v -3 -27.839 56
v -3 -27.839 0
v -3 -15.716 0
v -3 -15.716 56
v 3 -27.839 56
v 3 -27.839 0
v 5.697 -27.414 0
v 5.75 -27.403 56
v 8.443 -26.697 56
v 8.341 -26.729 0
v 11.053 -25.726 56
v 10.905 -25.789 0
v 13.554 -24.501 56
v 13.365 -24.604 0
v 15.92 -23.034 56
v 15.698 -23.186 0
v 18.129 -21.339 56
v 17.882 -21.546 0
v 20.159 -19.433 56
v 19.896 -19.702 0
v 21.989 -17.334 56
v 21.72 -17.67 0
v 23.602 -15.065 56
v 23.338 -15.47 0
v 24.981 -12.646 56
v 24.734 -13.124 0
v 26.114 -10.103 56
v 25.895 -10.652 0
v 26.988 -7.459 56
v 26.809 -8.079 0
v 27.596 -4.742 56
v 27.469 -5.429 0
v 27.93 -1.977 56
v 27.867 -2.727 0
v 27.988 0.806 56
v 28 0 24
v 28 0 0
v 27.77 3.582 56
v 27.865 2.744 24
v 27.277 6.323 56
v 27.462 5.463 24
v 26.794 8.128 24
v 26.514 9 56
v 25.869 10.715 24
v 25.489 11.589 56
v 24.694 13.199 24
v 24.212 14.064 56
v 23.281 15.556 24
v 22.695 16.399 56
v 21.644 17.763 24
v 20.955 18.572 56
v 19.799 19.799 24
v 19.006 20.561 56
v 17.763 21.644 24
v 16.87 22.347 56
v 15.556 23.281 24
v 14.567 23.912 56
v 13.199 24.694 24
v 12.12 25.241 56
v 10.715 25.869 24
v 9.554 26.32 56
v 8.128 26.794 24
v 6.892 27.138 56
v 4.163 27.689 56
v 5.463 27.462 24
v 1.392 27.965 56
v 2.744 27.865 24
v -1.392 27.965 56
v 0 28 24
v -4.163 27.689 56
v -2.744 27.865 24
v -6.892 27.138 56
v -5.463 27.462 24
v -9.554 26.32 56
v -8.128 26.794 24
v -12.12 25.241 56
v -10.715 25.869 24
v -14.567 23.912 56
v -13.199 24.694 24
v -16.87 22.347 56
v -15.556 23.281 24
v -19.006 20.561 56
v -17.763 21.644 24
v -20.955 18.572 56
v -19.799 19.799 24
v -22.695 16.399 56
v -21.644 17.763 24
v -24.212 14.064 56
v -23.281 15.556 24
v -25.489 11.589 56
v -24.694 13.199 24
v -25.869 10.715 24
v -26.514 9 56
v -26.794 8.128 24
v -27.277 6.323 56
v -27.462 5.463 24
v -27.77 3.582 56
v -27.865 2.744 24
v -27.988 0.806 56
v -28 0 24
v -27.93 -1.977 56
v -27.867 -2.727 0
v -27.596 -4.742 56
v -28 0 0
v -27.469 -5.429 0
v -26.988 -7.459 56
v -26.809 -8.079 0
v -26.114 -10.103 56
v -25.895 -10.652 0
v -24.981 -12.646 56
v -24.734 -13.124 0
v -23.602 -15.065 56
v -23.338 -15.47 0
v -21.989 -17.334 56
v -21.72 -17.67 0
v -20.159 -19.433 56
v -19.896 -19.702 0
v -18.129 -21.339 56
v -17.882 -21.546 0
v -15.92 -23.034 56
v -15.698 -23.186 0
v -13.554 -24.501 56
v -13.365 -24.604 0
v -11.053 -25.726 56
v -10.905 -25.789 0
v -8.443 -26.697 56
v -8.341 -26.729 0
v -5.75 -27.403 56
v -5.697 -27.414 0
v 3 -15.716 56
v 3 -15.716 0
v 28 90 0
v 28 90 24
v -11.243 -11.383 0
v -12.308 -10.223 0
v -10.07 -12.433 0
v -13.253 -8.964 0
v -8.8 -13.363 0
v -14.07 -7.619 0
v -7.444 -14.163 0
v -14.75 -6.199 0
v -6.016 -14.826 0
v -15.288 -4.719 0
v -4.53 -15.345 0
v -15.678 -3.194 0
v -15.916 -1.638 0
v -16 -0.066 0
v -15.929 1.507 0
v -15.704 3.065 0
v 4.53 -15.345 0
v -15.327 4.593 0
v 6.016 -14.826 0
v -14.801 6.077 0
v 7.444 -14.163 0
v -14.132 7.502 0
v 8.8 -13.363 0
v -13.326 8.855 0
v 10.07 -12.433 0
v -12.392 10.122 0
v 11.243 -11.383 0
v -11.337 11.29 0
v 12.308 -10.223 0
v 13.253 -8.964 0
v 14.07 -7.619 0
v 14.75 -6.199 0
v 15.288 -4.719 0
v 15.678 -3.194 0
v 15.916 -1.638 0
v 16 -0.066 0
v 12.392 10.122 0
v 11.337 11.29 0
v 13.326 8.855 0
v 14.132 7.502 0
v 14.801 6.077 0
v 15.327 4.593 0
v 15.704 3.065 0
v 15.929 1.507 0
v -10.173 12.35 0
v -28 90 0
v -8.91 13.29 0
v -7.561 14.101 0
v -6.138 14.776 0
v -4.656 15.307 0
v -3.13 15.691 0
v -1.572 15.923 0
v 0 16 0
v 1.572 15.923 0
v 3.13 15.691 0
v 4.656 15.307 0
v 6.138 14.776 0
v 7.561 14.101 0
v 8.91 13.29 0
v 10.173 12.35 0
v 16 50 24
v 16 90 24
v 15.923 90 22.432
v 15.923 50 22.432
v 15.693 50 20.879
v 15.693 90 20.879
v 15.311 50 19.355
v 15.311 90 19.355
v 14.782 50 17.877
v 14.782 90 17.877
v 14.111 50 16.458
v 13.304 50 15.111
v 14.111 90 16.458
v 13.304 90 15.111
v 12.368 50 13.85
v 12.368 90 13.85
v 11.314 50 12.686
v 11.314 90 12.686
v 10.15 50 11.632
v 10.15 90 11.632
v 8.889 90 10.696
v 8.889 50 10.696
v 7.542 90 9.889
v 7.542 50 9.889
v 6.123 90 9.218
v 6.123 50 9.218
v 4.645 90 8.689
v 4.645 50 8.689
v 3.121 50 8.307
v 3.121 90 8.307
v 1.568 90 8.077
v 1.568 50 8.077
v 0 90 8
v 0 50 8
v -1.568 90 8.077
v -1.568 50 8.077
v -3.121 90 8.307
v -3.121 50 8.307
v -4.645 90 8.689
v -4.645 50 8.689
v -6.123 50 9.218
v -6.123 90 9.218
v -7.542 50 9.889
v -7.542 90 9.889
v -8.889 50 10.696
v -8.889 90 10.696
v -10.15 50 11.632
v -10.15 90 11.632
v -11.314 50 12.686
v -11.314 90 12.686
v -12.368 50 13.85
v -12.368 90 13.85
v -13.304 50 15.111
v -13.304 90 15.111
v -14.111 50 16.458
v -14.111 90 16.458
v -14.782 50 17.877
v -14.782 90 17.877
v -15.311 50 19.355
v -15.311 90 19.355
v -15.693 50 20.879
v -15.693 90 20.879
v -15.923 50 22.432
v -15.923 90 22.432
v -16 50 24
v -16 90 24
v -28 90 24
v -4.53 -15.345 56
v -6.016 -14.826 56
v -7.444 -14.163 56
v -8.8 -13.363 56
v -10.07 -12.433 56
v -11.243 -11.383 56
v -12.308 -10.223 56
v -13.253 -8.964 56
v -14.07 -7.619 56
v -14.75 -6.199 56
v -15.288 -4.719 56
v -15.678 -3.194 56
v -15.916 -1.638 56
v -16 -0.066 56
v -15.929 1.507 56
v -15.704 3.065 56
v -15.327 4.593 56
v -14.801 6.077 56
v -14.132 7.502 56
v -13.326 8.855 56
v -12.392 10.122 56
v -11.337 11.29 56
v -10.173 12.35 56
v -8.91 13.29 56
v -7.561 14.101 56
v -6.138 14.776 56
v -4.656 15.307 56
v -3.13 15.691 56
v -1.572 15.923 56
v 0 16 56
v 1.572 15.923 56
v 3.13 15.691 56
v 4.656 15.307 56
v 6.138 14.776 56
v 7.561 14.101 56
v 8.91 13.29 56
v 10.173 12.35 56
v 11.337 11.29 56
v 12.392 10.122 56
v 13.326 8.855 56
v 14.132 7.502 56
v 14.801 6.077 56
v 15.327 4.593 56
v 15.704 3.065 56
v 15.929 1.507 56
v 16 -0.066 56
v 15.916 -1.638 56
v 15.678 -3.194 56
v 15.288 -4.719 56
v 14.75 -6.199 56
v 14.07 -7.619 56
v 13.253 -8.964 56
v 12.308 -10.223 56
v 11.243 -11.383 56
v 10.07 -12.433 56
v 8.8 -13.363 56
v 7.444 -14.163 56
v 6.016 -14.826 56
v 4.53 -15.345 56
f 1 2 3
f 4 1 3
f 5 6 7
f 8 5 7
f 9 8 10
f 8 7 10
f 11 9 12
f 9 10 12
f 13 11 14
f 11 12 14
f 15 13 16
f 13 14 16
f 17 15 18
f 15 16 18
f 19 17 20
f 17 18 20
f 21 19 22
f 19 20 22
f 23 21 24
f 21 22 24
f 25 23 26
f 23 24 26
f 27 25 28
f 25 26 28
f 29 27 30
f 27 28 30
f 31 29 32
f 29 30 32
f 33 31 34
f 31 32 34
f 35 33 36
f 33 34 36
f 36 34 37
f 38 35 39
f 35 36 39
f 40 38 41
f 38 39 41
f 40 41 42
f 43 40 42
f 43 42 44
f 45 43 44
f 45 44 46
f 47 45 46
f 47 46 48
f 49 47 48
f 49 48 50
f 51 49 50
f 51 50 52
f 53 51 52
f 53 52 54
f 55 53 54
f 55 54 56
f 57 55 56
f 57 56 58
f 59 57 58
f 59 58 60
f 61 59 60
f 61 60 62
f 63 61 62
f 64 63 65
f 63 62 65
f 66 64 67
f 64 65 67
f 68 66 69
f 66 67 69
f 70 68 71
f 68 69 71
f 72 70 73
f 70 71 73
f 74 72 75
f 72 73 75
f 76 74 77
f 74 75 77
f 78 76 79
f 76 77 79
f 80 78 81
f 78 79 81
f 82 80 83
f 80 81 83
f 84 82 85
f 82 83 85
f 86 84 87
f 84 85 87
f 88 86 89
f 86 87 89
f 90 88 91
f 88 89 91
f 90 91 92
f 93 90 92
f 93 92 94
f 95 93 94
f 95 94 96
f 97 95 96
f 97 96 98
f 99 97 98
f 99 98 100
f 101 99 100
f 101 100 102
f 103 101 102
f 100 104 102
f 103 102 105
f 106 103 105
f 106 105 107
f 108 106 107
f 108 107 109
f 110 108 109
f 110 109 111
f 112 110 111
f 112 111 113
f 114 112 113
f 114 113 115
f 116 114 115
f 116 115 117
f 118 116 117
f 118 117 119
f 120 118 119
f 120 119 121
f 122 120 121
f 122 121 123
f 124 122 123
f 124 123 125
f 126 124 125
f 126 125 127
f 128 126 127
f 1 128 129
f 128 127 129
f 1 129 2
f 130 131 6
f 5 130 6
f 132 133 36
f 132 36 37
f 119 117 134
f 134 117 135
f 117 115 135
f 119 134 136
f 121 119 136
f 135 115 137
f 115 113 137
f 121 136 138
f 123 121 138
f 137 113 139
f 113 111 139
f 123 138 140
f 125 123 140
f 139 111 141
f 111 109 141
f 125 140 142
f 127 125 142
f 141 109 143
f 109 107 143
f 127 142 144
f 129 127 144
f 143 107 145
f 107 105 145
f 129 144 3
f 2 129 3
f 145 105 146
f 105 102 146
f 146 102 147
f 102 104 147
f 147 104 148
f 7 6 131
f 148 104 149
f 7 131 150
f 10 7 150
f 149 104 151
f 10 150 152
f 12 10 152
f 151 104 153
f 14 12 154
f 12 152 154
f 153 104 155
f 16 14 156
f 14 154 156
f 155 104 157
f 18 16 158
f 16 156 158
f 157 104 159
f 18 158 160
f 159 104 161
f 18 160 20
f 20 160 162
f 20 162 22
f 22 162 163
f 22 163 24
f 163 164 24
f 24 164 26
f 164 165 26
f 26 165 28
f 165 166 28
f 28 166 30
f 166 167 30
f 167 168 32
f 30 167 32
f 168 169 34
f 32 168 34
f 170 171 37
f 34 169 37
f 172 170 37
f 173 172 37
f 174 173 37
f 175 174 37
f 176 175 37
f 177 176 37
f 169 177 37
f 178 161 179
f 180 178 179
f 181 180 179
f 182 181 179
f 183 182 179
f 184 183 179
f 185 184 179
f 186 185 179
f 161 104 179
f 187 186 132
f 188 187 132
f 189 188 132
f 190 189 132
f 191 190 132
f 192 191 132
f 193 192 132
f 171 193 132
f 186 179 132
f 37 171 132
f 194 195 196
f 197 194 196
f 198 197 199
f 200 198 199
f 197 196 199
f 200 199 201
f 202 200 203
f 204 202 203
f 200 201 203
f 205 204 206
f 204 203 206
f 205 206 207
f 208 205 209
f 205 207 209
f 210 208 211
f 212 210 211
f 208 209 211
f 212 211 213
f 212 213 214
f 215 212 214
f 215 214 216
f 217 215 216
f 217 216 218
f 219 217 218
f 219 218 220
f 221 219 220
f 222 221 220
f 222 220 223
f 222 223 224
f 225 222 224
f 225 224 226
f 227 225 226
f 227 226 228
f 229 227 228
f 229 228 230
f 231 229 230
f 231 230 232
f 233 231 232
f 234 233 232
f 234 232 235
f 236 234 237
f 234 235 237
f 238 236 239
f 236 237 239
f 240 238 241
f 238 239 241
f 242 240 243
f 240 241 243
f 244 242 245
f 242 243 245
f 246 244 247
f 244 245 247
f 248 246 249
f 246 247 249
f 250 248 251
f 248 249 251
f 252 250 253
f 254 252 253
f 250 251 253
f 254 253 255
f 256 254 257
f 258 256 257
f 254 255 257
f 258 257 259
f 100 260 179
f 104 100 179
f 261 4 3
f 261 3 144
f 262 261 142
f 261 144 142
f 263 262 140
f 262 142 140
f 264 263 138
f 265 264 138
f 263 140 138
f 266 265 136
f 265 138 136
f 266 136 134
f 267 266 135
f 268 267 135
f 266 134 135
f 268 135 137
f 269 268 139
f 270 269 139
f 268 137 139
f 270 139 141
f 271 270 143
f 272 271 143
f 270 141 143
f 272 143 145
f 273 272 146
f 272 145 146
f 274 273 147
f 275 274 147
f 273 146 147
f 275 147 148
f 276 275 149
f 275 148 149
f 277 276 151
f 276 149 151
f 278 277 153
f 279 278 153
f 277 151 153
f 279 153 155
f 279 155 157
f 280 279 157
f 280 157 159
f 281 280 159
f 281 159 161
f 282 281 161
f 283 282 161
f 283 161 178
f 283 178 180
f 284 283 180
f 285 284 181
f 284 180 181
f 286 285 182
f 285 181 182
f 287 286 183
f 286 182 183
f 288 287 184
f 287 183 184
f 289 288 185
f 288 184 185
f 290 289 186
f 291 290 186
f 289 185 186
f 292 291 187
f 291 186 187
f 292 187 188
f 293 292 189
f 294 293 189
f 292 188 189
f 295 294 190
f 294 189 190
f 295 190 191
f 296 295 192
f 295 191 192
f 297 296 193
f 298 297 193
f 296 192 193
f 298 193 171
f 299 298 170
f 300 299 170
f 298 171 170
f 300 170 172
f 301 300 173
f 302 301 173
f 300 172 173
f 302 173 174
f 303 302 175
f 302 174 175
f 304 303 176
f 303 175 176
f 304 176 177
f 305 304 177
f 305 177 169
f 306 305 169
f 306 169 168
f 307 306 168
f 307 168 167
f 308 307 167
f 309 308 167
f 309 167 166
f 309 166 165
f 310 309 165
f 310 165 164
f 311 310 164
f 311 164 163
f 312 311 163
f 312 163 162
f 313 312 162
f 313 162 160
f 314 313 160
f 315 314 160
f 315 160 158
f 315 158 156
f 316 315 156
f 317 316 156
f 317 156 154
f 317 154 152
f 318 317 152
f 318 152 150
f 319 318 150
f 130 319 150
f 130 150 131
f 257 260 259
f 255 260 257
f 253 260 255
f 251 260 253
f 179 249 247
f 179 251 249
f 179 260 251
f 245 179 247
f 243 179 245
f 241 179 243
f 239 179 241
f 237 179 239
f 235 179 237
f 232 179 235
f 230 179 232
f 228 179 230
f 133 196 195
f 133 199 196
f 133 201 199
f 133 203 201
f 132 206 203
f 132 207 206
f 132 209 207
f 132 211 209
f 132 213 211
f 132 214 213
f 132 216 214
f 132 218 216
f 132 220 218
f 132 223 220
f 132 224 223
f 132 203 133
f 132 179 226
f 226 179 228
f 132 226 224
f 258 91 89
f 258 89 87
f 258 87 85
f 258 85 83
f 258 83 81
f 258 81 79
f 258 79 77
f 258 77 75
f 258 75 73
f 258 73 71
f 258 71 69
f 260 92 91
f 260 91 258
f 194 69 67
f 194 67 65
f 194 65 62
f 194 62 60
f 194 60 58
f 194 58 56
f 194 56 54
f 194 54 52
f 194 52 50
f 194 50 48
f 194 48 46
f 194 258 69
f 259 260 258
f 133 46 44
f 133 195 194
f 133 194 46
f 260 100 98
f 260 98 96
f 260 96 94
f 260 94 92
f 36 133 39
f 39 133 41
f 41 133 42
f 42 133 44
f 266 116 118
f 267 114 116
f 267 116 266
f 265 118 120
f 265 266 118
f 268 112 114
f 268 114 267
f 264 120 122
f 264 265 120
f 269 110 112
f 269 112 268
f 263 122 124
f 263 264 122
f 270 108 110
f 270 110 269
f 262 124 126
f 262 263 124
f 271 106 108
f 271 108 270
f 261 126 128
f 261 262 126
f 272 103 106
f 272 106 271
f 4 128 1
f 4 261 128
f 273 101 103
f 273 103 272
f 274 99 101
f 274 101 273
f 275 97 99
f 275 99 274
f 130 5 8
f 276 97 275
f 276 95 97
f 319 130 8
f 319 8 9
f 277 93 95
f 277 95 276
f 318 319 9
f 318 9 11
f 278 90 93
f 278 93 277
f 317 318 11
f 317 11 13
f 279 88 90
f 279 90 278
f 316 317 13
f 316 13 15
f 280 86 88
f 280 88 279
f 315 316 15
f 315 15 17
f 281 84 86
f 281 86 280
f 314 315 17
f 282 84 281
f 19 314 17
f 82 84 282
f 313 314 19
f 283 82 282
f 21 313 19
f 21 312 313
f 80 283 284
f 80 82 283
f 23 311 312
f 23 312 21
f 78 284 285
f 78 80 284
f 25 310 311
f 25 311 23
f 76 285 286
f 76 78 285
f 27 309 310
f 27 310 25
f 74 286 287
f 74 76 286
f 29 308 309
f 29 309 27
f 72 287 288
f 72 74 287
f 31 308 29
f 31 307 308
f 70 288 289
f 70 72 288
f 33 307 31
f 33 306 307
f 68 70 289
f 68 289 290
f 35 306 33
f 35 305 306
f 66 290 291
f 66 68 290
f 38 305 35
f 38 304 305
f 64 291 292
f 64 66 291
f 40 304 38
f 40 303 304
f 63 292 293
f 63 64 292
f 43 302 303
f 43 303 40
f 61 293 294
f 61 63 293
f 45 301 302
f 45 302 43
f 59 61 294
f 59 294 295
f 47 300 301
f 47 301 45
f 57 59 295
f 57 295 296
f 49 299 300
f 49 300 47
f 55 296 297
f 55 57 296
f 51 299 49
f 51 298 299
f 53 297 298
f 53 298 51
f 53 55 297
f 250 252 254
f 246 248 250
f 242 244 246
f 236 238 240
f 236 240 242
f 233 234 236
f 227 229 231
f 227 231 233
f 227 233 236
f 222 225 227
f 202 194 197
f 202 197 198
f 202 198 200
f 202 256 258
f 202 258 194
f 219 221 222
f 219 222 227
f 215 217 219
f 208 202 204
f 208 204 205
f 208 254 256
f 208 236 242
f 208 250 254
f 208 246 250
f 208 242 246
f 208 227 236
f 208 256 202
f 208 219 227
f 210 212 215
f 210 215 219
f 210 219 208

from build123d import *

# Parameters (mm, degrees)
BOSS_EXTRUDE1_DEPTH      = 56
BOSS_EXTRUDE2_REACH      = 135.439
BOSS_EXTRUDE2_END_RADIUS = 28
SKETCH2_W                = 56
SKETCH2_H                = 24
CUT_EXTRUDE1_DEPTH       = 40


with BuildPart() as part:
    # Sketch1 → Boss-Extrude1 (new body)
    with BuildSketch(Plane.XY):
        with BuildLine():
            Line((-3, -27.838821814), (-3, -15.716233646))
            ThreePointArc((-3, -15.716233646), (0, 16), (3, -15.716233646))
            Line((3, -15.716233646), (3, -27.838821814))
            ThreePointArc((3, -27.838821814), (0, 28), (-3, -27.838821814))
        make_face()
    extrude(amount=BOSS_EXTRUDE1_DEPTH)

    # Boss-Extrude2: up to this cylinder (the profile starts outside it)
    boss_extrude2_end = Plane(origin=(0, 0, 12), z_dir=(0, 0, -1)) * Cylinder(BOSS_EXTRUDE2_END_RADIUS, 327.878, mode=Mode.PRIVATE)
    # Sketch2 → Boss-Extrude2 (add, up to the surface)
    with BuildSketch(Plane(origin=(0, 90, 0), x_dir=(1, 0, 0), z_dir=(0, 1, 0)), mode=Mode.PRIVATE) as boss_extrude2_sk1:
        with Locations((0, -12)):
            Rectangle(SKETCH2_W, SKETCH2_H)
    boss_extrude2_tool1 = extrude(boss_extrude2_sk1.sketch, amount=-BOSS_EXTRUDE2_REACH, mode=Mode.PRIVATE) - boss_extrude2_end
    add(boss_extrude2_tool1.solids().sort_by_distance((0, 90, 12))[0])

    # Sketch3 → Cut-Extrude1 (cut)
    with BuildSketch(Plane(origin=(0, 90, 0), x_dir=(1, 0, 0), z_dir=(0, 1, 0))):
        with BuildLine():
            ThreePointArc((16, -24), (0, -8), (-16, -24))
            Line((-16, -24), (16, -24))
        make_face()
        with BuildLine():
            Line((16, -24), (-16, -24))
            ThreePointArc((-16, -24), (0, -40), (16, -24))
        make_face()
    extrude(amount=-CUT_EXTRUDE1_DEPTH, mode=Mode.SUBTRACT)


solid = part.part
